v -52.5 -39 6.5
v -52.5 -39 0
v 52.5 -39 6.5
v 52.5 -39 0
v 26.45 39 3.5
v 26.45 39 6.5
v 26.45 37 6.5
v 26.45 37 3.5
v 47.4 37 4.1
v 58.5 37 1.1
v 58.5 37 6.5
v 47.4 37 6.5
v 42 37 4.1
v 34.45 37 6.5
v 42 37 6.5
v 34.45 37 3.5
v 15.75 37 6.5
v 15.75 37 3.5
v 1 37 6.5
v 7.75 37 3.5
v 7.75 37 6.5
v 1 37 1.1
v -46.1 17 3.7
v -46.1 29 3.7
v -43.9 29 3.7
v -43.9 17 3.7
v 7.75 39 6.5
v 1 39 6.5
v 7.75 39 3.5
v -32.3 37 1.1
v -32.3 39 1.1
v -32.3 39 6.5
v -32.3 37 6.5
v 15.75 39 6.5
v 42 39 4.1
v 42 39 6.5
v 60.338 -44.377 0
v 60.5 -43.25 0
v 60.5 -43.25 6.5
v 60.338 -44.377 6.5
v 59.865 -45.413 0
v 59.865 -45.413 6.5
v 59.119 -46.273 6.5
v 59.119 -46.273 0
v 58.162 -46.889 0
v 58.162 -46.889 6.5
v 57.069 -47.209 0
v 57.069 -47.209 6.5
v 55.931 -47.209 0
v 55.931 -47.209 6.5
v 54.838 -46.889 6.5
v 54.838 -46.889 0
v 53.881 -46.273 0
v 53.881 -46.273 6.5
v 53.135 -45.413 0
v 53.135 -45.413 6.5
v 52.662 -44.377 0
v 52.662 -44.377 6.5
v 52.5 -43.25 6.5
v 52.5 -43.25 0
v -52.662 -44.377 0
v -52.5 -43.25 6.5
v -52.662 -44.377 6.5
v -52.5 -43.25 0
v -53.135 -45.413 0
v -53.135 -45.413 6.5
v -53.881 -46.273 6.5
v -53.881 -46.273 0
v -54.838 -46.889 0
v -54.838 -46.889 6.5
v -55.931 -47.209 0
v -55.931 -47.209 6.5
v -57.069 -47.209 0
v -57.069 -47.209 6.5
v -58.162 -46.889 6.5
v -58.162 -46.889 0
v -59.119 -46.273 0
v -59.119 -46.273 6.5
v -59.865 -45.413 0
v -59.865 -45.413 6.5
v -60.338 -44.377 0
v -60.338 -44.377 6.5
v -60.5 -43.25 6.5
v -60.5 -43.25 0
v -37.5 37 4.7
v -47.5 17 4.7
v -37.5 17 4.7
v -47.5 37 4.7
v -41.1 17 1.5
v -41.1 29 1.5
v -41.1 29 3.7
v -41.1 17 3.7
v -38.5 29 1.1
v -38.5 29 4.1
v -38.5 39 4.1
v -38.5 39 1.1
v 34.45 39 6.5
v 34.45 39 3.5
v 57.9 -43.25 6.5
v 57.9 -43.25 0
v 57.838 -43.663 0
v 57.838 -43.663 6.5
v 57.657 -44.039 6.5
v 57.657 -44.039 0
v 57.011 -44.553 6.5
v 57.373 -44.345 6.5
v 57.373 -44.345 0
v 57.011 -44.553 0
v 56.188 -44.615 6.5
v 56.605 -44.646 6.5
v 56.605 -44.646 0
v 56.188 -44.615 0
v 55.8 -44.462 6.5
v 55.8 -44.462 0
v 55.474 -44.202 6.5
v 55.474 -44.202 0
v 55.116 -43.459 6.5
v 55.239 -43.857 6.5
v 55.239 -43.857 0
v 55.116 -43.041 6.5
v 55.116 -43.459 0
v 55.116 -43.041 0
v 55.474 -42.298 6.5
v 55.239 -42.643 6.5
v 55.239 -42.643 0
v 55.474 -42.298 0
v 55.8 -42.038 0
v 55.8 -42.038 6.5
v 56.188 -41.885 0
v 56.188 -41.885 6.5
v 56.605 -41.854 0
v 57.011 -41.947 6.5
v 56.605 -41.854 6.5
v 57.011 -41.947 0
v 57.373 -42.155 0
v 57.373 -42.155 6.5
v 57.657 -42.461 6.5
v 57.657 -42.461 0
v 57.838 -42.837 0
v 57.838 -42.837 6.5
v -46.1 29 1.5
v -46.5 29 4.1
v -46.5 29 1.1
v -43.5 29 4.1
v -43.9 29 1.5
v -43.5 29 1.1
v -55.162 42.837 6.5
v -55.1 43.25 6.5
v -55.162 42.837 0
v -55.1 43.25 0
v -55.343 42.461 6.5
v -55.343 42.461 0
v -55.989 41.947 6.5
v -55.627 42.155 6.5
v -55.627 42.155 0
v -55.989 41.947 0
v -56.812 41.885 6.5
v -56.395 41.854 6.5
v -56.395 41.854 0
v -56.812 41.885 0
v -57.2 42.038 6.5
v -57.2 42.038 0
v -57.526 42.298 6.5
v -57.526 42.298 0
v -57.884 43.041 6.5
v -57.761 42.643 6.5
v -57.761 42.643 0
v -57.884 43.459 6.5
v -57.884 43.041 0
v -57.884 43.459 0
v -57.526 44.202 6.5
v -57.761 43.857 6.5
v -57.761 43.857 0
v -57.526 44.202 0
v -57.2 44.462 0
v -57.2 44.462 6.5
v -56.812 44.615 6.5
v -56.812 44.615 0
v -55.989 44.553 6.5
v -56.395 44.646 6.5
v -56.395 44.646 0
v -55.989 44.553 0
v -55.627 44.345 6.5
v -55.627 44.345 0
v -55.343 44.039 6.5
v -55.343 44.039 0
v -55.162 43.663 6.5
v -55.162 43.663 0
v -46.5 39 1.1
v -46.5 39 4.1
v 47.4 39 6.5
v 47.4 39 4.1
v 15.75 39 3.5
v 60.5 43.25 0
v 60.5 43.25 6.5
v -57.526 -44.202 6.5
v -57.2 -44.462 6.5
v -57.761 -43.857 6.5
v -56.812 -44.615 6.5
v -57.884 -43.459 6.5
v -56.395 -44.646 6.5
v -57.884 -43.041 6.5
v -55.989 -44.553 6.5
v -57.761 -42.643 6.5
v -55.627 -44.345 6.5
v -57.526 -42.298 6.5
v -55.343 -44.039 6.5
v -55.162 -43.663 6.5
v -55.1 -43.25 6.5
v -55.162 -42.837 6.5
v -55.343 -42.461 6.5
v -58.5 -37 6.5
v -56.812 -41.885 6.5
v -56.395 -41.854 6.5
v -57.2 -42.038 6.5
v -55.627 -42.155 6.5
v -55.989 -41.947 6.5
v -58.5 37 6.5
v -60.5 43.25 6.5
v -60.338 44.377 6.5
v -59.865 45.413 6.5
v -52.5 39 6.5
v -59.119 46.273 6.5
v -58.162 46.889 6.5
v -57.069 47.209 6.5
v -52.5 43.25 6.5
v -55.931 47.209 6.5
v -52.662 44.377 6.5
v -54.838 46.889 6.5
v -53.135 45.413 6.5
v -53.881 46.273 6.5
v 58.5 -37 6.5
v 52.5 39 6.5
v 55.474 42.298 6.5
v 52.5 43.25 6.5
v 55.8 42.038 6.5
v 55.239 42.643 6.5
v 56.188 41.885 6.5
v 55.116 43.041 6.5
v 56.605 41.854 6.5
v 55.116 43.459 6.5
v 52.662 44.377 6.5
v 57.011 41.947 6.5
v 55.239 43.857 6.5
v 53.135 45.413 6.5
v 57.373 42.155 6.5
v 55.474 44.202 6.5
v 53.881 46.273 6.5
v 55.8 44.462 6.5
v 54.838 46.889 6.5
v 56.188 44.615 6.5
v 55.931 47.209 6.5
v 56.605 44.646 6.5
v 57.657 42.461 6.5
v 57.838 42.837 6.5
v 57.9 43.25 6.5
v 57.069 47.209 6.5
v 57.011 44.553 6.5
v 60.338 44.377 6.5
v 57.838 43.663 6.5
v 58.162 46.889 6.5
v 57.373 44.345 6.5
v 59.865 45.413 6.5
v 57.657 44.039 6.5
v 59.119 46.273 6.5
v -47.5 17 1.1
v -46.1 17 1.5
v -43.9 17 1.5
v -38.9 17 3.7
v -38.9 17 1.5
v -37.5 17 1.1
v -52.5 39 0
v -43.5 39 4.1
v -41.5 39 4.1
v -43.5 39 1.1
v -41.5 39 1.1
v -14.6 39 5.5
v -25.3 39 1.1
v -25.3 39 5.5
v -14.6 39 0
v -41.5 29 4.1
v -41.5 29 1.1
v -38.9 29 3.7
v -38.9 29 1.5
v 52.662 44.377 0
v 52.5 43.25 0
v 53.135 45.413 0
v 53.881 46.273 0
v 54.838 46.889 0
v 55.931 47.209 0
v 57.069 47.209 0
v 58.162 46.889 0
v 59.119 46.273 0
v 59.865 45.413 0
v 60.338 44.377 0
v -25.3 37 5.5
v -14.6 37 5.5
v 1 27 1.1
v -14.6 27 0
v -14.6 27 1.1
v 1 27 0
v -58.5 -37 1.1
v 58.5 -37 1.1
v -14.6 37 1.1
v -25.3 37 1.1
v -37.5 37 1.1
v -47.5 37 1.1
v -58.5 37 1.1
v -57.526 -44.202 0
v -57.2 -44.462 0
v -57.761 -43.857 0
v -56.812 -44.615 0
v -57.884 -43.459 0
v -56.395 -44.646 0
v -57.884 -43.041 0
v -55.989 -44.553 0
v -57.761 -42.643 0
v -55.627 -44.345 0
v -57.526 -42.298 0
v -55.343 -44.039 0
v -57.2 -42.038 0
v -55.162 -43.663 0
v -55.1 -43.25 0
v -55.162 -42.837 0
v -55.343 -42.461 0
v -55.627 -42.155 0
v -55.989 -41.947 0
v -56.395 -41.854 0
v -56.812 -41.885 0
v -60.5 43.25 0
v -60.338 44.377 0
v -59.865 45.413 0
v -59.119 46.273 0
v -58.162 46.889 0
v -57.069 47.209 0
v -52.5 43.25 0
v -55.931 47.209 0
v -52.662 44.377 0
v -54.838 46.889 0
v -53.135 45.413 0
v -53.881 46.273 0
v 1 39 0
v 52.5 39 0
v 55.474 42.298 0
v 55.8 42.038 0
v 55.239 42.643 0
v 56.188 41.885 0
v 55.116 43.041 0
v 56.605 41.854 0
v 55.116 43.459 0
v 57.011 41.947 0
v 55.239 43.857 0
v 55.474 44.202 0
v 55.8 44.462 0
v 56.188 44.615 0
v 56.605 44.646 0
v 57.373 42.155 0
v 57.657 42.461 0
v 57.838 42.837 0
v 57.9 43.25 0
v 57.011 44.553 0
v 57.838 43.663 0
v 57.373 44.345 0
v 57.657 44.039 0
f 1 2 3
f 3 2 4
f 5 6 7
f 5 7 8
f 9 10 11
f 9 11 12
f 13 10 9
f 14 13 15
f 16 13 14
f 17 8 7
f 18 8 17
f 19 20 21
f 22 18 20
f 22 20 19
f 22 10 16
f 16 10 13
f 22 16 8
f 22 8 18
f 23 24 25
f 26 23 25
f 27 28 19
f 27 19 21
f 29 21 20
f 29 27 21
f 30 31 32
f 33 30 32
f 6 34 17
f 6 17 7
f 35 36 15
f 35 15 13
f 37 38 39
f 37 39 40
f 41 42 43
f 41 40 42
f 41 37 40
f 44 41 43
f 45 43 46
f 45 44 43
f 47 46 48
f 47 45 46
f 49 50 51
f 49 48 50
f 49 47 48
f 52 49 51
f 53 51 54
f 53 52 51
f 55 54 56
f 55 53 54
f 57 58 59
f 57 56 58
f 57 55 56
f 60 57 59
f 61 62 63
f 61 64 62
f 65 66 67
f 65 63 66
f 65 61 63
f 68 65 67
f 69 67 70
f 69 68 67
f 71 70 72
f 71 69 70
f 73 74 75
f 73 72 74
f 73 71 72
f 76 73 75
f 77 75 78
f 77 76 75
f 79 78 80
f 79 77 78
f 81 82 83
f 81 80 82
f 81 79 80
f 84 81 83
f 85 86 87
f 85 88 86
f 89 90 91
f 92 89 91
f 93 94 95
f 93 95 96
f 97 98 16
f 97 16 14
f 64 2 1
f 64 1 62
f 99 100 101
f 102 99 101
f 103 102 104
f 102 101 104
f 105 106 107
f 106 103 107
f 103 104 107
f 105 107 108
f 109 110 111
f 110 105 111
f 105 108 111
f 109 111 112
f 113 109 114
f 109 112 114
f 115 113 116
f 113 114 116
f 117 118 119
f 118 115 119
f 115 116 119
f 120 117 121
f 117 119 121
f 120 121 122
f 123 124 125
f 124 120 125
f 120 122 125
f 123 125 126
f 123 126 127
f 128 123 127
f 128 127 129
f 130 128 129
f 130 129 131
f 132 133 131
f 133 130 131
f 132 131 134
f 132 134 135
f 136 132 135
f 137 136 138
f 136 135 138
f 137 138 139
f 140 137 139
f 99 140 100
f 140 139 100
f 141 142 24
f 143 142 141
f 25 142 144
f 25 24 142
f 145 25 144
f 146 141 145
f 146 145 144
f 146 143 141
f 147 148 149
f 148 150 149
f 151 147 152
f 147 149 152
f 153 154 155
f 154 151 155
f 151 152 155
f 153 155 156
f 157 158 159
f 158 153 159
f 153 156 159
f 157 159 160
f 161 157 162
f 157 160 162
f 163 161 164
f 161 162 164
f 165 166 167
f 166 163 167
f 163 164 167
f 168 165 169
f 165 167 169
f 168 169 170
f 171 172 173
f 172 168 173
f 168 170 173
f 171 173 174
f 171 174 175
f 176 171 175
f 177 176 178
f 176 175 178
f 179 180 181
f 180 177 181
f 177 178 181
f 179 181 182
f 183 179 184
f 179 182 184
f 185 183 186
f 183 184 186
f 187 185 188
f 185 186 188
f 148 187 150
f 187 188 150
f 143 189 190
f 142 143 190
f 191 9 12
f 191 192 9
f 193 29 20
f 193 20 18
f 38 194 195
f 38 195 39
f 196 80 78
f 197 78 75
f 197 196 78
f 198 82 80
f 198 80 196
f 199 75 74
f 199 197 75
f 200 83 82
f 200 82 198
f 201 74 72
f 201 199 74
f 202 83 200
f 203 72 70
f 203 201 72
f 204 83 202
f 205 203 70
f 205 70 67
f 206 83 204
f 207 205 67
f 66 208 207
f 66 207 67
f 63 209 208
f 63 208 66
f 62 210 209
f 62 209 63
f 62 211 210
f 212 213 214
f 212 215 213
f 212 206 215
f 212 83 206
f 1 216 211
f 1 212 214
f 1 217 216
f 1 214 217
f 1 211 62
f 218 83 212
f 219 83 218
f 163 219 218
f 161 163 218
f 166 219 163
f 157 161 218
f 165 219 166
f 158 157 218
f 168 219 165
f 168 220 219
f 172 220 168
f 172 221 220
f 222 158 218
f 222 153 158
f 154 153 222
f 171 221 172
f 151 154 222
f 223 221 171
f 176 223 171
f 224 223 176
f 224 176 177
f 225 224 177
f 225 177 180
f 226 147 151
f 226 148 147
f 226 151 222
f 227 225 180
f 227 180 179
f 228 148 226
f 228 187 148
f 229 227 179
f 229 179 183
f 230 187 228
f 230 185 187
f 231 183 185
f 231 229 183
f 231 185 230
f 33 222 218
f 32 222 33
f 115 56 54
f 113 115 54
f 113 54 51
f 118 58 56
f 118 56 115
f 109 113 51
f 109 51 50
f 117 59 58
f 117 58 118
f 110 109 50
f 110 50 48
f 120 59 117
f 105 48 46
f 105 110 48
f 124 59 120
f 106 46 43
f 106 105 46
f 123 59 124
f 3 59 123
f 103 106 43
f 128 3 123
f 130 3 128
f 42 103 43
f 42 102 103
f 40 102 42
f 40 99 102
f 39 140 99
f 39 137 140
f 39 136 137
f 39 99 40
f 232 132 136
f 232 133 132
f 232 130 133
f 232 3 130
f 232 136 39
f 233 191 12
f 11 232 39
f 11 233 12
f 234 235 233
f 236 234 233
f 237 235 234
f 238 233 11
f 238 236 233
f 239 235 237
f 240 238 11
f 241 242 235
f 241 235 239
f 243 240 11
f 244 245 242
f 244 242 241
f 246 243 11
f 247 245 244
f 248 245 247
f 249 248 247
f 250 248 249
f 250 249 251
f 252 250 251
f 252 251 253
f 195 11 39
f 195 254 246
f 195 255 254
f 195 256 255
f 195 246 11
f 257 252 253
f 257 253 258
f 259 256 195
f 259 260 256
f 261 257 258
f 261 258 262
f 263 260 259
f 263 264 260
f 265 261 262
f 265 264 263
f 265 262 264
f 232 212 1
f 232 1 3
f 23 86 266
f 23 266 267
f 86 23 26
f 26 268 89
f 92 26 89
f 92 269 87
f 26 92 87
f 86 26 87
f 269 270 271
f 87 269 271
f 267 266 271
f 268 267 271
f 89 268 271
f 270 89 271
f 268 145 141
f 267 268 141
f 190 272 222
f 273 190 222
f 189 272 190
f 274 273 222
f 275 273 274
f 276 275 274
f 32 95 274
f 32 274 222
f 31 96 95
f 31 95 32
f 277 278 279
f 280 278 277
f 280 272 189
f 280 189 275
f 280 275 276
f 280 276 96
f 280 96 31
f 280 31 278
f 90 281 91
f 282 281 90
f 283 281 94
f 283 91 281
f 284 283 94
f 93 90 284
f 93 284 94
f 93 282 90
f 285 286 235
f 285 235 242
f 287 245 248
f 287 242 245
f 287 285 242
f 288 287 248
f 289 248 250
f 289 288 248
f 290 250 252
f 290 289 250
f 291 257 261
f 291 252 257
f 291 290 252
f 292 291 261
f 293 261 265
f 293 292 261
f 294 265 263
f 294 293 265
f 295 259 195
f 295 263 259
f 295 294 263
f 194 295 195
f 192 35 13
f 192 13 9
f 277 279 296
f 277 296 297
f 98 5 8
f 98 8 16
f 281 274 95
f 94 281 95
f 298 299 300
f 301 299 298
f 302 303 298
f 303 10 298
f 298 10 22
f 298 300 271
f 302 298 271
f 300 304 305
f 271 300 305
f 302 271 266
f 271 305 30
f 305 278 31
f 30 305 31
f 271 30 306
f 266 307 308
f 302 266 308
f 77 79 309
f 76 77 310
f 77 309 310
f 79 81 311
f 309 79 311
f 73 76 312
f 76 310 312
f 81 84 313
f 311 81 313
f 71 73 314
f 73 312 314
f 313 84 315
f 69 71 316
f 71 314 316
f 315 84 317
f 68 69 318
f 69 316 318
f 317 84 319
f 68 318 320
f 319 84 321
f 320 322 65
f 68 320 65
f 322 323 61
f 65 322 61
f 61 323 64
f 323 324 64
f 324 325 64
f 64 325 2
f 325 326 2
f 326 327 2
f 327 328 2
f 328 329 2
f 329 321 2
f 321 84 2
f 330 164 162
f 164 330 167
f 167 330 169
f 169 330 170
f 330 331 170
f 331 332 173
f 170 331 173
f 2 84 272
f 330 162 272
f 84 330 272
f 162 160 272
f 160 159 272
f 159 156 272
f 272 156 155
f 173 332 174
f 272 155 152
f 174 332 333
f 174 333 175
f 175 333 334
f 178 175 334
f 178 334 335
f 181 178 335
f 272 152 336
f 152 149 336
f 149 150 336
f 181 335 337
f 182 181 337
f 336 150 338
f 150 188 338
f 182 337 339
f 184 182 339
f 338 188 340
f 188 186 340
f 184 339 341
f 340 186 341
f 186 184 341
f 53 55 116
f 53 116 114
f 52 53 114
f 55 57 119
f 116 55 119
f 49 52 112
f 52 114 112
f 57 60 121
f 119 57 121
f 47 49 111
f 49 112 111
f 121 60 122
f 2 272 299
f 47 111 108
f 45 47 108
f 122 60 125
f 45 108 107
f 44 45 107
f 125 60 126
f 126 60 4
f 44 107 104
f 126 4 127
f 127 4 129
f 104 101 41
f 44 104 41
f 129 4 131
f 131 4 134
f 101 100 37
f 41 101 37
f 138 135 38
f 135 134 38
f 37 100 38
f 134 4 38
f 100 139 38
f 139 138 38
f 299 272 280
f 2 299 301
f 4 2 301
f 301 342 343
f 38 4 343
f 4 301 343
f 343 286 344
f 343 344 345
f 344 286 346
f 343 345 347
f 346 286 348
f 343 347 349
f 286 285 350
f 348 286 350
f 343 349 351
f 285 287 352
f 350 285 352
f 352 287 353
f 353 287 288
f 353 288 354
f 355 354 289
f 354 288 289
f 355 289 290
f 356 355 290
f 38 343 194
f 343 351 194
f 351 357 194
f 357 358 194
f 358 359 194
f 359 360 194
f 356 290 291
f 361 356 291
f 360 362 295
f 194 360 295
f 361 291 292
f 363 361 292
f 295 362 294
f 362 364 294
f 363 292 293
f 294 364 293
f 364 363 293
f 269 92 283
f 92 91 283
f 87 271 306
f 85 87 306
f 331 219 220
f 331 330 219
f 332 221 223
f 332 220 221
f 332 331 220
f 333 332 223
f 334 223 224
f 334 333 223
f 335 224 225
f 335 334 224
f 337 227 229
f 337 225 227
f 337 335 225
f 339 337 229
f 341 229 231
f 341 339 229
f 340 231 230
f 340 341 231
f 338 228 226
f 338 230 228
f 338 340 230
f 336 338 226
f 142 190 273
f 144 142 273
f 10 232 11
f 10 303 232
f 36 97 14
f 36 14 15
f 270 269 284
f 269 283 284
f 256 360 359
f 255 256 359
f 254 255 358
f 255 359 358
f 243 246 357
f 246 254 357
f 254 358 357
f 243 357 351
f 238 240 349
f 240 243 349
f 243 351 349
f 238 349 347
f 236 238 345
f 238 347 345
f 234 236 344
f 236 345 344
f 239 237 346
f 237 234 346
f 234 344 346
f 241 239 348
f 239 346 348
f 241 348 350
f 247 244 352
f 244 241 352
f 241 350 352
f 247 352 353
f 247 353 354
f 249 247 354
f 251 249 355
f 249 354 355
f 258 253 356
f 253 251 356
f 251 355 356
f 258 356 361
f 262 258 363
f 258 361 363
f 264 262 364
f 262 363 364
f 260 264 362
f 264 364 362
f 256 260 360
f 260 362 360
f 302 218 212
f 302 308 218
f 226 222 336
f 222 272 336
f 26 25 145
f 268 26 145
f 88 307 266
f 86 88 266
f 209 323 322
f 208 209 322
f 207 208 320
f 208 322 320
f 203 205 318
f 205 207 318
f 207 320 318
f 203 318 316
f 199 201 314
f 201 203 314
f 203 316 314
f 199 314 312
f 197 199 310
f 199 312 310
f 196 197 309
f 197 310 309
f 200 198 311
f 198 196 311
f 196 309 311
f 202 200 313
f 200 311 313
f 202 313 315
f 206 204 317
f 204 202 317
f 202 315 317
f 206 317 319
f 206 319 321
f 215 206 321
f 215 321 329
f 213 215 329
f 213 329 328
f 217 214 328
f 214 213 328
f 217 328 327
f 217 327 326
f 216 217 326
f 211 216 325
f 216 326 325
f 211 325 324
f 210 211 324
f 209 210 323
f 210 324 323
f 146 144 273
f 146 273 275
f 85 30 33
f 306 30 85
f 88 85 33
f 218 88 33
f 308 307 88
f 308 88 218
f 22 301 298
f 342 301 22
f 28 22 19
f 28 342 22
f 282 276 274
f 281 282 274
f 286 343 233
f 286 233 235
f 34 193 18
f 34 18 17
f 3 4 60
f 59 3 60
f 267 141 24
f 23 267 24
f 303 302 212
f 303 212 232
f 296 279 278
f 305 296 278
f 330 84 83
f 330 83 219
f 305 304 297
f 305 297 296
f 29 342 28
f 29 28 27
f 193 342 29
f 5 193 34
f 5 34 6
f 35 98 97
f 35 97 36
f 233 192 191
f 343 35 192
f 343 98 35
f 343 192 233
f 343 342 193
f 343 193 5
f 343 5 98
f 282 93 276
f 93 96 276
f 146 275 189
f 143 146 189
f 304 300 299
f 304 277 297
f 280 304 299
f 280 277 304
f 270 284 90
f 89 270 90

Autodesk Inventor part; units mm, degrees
ref_plane "YZ Plane" through (0, 0, 0) normal (1, 0, 0) x (0, 1, 0)
ref_plane "XZ Plane" through (0, 0, 0) normal (0, 1, 0) x (-1, 0, 0)
ref_plane "XY Plane" through (0, 0, 0) normal (0, 0, 1) x (1, 0, 0)
sketch "Skizze1" plane through (0, 0, 0) normal (0, 0, 1) x (1, 0, 0)
  line L0 (-52.5, 39) -> (52.5, 39)
  line L1 (-52.5, -39) -> (52.5, -39)
  line L2 (52.5, -39) -> (52.5, -43.25)
  line L3 (-52.5, -39) -> (-52.5, -43.25)
  line L4 (-60.5, -43.25) -> (-60.5, 43.25)
  line L5 (-52.5, 39) -> (-52.5, 43.25)
  line L6 (52.5, 39) -> (52.5, 43.25)
  line L7 (60.5, 43.25) -> (60.5, -43.25)
  arc A0 (-52.5, 43.25) -> (-60.5, 43.25) centre (-56.5, 43.25) ccw
  arc A1 (60.5, 43.25) -> (52.5, 43.25) centre (56.5, 43.25) ccw
  arc A2 (52.5, -43.25) -> (60.5, -43.25) centre (56.5, -43.25) ccw
  arc A3 (-60.5, -43.25) -> (-52.5, -43.25) centre (-56.5, -43.25) ccw
  line L8 (0, 66.15) -> (0, -66.15) construction
  line L9 (-84.7, 0) -> (84.7, 0) construction
  circle A4 centre (-56.5, 43.25) radius 1.4
  circle A5 centre (56.5, 43.25) radius 1.4
  circle A6 centre (56.5, -43.25) radius 1.4
  circle A7 centre (-56.5, -43.25) radius 1.4
  point P0 (0, 0)
  dimension "d0" = 121
  dimension "d1" = 78
  dimension "d2" = 8
  dimension "d3" = 86.5
  dimension "d4" = 2.8
extrude "Extrusion1" add sketch "Skizze1" along normal blind 1.1
sketch "Skizze8" plane through (0, 0, 1.1) normal (0, 0, 1) x (1, 0, 0)
  line L0 (-58.5, -37) -> (58.5, -37)
  line L1 (58.5, -37) -> (58.5, 37)
  line L2 (58.5, 37) -> (-58.5, 37)
  line L3 (-58.5, 37) -> (-58.5, -37)
  line L4 (-58.5, -37) -> (58.5, 37) construction
  line L5 (58.5, -37) -> (-58.5, 37) construction
  line L6 (60.5, -43.25) -> (60.5, 43.25) projected
  line L7 (52.5, 39) -> (-52.5, 39) projected
  line L8 (-60.5, 43.25) -> (-60.5, -43.25) projected
  arc A0 (-60.5, -43.25) -> (-52.5, -43.25) centre (-56.5, -43.25) ccw projected
  line L9 (-52.5, -43.25) -> (-52.5, -39) projected
  line L10 (-52.5, -39) -> (52.5, -39) projected
  line L11 (52.5, -39) -> (52.5, -43.25) projected
  arc A1 (52.5, -43.25) -> (60.5, -43.25) centre (56.5, -43.25) ccw projected
  line L12 (60.5, -43.25) -> (60.5, 43.25) projected
  arc A2 (60.5, 43.25) -> (52.5, 43.25) centre (56.5, 43.25) ccw projected
  line L13 (52.5, 43.25) -> (52.5, 39) projected
  line L14 (52.5, 39) -> (-52.5, 39) projected
  line L15 (-52.5, 39) -> (-52.5, 43.25) projected
  arc A3 (-52.5, 43.25) -> (-60.5, 43.25) centre (-56.5, 43.25) ccw projected
  circle A4 centre (-56.5, -43.25) radius 1.4 projected
  circle A5 centre (56.5, -43.25) radius 1.4 projected
  circle A6 centre (56.5, 43.25) radius 1.4 projected
  circle A7 centre (-56.5, 43.25) radius 1.4 projected
  point P0 (0, 0)
  dimension "d45" = 2
  dimension "d46" = 2
extrude "Extrusion8" add sketch "Skizze8" along normal blind 5.4
sketch "Skizze9" plane through (-52.5, 39, 0) normal (0, 1, 0) x (1, 0, 0)
  line L0 (105, -6.5) -> (0, -6.5) projected
  line L1 (-6, -6.5) -> (111, -6.5) projected
  line L2 (99.9, -6.5) -> (94.5, -6.5)
  line L3 (94.5, -6.5) -> (94.5, -4.1)
  line L4 (94.5, -4.1) -> (99.9, -4.1)
  line L5 (99.9, -4.1) -> (99.9, -6.5)
  line L6 (86.95, -6.5) -> (78.95, -6.5)
  line L7 (78.95, -6.5) -> (78.95, -3.5)
  line L8 (78.95, -3.5) -> (86.95, -3.5)
  line L9 (86.95, -3.5) -> (86.95, -6.5)
  line L10 (68.25, -6.5) -> (60.25, -6.5)
  line L11 (60.25, -6.5) -> (60.25, -3.5)
  line L12 (60.25, -3.5) -> (68.25, -3.5)
  line L13 (68.25, -3.5) -> (68.25, -6.5)
  line L14 (53.5, -6.5) -> (37.9, -6.5)
  line L15 (37.9, -6.5) -> (37.9, 0.5)
  line L16 (37.9, 0.5) -> (53.5, 0.5)
  line L17 (53.5, 0.5) -> (53.5, -6.5)
  line L18 (20.2, -6.5) -> (27.2, -6.5)
  line L19 (27.2, -6.5) -> (27.2, -1.1)
  line L20 (27.2, -1.1) -> (20.2, -1.1)
  line L21 (20.2, -1.1) -> (20.2, -6.5)
  line L22 (97.2, -4.1) -> (97.2, -6.5) construction
  line L23 (82.95, -3.5) -> (82.95, -6.5) construction
  line L24 (64.25, -3.5) -> (64.25, -6.5) construction
  line L25 (45.7, 0.5) -> (45.7, -6.5) construction
  line L26 (23.7, -1.1) -> (23.7, -6.5) construction
  line L27 (105, 0) -> (105, -6.5) construction
  line L28 (37.9, -6.5) -> (27.2, -6.5)
  line L29 (27.2, -6.5) -> (27.2, -5.5)
  line L30 (27.2, -5.5) -> (37.9, -5.5)
  line L31 (37.9, -5.5) -> (37.9, -6.5)
  point P0 (52.5, 0)
  point P1 (27.2, -6.5)
  point P2 (94.5, -6.5)
  point P3 (99.9, -6.5)
  dimension "d49" = 7.8
  dimension "d50" = 22.05
  dimension "d51" = 40.75
  dimension "d52" = 59.3
  dimension "d53" = 81.3
  dimension "d54" = 2.4
  dimension "d55" = 3
  dimension "d56" = 7
  dimension "d57" = 5.4
  dimension "d58" = 5.4
  dimension "d59" = 8
  dimension "d60" = 8
  dimension "d61" = 15.6
  dimension "d62" = 7
  dimension "d65" = 1
extrude "Extrusion9" cut sketch "Skizze9" against normal blind 12
sketch "Skizze11" plane through (0, 0, 1.1) normal (0, 0, 1) x (1, 0, 0)
  line L0 (-58.5, 37) -> (-32.3, 37) projected
  line L1 (-37.5, 37) -> (-47.5, 37)
  line L2 (-47.5, 37) -> (-47.5, 17)
  line L3 (-47.5, 17) -> (-37.5, 17)
  line L4 (-37.5, 17) -> (-37.5, 37)
  line L5 (-52.5, 39) -> (-52.5, 43.25) projected
  point P0 (0, 0)
  point P1 (-42.5, 37)
  dimension "d66" = 10
  dimension "d67" = 10
  dimension "d68" = 20
extrude "Extrusion10" add sketch "Skizze11" along normal blind 3.6
sketch "Skizze12" plane through (-52.5, 39, 6.5) normal (0, 1, 0) x (1, 0, 0)
  line L0 (5, 5.4) -> (5, 1.8) projected
  line L1 (15, 5.4) -> (5, 5.4) projected
  line L2 (15, 5.4) -> (15, 1.8) projected
  line L3 (10, 5.4) -> (10, 0) construction
  line L4 (13.6, 5) -> (11.4, 5)
  line L5 (11.4, 5) -> (11.4, 2.8)
  line L6 (11.4, 2.8) -> (13.6, 2.8)
  line L7 (13.6, 2.8) -> (13.6, 5)
  line L8 (13.6, 5) -> (11.4, 2.8) construction
  line L9 (11.4, 5) -> (13.6, 2.8) construction
  line L10 (8.6, 5) -> (6.4, 5)
  line L11 (6.4, 5) -> (6.4, 2.8)
  line L12 (6.4, 2.8) -> (8.6, 2.8)
  line L13 (8.6, 2.8) -> (8.6, 5)
  line L14 (8.6, 5) -> (6.4, 2.8) construction
  line L15 (6.4, 5) -> (8.6, 2.8) construction
  line L16 (5, 1.8) -> (15, 1.8) projected
  point P0 (52.5, 6.5)
  point P1 (12.5, 3.9)
  point P2 (7.5, 3.9)
  point P3 (7.5, 3.9)
  point P4 (12.5, 3.9)
  point P5 (8.6, 5.4)
  point P6 (6.4, 5.4)
  point P7 (13.6, 5.4)
  point P8 (11.4, 5.4)
  point P9 (7.5, 3.9)
  dimension "d73" = 5
  dimension "d74" = 2.2
  dimension "d75" = 2.2
  dimension "d78" = 1.5
extrude "Extrusion11" cut sketch "Skizze12" against normal up to surface (22 mm away) contours L7 L6 L5 L4 | L13 L12 L11 L10
sketch "Skizze13" plane through (-52.5, 39, 6.5) normal (0, 1, 0) x (1, 0, 0)
  line L0 (13.6, 2.8) -> (11.4, 2.8) construction
  line L1 (11.4, 5) -> (13.6, 5) construction
  line L2 (8.6, 2.8) -> (6.4, 2.8) construction
  line L3 (6.4, 5) -> (8.6, 5) construction
  line L4 (7.5, 2.8) -> (7.5, 5) construction
  line L5 (8.6, 5) -> (6.4, 5) construction
  line L6 (12.5, 5) -> (12.5, 2.8) construction
  line L7 (14, 5.4) -> (11, 5.4)
  line L8 (11, 5.4) -> (11, 2.4)
  line L9 (11, 2.4) -> (14, 2.4)
  line L10 (14, 2.4) -> (14, 5.4)
  line L11 (14, 5.4) -> (11, 2.4) construction
  line L12 (11, 5.4) -> (14, 2.4) construction
  line L13 (9, 5.4) -> (6, 5.4)
  line L14 (6, 5.4) -> (6, 2.4)
  line L15 (6, 2.4) -> (9, 2.4)
  line L16 (9, 2.4) -> (9, 5.4)
  line L17 (9, 5.4) -> (6, 2.4) construction
  line L18 (6, 5.4) -> (9, 2.4) construction
  point P0 (52.5, 6.5)
  point P1 (12.5, 3.9)
  point P2 (7.5, 3.9)
  dimension "d79" = 3
  dimension "d80" = 3
  dimension "d81" = 3
  dimension "d82" = 3
extrude "Extrusion12" cut sketch "Skizze13" against normal blind 10
equation "\"d60\" = d59"
properties part number "Display 5inch Housing"
